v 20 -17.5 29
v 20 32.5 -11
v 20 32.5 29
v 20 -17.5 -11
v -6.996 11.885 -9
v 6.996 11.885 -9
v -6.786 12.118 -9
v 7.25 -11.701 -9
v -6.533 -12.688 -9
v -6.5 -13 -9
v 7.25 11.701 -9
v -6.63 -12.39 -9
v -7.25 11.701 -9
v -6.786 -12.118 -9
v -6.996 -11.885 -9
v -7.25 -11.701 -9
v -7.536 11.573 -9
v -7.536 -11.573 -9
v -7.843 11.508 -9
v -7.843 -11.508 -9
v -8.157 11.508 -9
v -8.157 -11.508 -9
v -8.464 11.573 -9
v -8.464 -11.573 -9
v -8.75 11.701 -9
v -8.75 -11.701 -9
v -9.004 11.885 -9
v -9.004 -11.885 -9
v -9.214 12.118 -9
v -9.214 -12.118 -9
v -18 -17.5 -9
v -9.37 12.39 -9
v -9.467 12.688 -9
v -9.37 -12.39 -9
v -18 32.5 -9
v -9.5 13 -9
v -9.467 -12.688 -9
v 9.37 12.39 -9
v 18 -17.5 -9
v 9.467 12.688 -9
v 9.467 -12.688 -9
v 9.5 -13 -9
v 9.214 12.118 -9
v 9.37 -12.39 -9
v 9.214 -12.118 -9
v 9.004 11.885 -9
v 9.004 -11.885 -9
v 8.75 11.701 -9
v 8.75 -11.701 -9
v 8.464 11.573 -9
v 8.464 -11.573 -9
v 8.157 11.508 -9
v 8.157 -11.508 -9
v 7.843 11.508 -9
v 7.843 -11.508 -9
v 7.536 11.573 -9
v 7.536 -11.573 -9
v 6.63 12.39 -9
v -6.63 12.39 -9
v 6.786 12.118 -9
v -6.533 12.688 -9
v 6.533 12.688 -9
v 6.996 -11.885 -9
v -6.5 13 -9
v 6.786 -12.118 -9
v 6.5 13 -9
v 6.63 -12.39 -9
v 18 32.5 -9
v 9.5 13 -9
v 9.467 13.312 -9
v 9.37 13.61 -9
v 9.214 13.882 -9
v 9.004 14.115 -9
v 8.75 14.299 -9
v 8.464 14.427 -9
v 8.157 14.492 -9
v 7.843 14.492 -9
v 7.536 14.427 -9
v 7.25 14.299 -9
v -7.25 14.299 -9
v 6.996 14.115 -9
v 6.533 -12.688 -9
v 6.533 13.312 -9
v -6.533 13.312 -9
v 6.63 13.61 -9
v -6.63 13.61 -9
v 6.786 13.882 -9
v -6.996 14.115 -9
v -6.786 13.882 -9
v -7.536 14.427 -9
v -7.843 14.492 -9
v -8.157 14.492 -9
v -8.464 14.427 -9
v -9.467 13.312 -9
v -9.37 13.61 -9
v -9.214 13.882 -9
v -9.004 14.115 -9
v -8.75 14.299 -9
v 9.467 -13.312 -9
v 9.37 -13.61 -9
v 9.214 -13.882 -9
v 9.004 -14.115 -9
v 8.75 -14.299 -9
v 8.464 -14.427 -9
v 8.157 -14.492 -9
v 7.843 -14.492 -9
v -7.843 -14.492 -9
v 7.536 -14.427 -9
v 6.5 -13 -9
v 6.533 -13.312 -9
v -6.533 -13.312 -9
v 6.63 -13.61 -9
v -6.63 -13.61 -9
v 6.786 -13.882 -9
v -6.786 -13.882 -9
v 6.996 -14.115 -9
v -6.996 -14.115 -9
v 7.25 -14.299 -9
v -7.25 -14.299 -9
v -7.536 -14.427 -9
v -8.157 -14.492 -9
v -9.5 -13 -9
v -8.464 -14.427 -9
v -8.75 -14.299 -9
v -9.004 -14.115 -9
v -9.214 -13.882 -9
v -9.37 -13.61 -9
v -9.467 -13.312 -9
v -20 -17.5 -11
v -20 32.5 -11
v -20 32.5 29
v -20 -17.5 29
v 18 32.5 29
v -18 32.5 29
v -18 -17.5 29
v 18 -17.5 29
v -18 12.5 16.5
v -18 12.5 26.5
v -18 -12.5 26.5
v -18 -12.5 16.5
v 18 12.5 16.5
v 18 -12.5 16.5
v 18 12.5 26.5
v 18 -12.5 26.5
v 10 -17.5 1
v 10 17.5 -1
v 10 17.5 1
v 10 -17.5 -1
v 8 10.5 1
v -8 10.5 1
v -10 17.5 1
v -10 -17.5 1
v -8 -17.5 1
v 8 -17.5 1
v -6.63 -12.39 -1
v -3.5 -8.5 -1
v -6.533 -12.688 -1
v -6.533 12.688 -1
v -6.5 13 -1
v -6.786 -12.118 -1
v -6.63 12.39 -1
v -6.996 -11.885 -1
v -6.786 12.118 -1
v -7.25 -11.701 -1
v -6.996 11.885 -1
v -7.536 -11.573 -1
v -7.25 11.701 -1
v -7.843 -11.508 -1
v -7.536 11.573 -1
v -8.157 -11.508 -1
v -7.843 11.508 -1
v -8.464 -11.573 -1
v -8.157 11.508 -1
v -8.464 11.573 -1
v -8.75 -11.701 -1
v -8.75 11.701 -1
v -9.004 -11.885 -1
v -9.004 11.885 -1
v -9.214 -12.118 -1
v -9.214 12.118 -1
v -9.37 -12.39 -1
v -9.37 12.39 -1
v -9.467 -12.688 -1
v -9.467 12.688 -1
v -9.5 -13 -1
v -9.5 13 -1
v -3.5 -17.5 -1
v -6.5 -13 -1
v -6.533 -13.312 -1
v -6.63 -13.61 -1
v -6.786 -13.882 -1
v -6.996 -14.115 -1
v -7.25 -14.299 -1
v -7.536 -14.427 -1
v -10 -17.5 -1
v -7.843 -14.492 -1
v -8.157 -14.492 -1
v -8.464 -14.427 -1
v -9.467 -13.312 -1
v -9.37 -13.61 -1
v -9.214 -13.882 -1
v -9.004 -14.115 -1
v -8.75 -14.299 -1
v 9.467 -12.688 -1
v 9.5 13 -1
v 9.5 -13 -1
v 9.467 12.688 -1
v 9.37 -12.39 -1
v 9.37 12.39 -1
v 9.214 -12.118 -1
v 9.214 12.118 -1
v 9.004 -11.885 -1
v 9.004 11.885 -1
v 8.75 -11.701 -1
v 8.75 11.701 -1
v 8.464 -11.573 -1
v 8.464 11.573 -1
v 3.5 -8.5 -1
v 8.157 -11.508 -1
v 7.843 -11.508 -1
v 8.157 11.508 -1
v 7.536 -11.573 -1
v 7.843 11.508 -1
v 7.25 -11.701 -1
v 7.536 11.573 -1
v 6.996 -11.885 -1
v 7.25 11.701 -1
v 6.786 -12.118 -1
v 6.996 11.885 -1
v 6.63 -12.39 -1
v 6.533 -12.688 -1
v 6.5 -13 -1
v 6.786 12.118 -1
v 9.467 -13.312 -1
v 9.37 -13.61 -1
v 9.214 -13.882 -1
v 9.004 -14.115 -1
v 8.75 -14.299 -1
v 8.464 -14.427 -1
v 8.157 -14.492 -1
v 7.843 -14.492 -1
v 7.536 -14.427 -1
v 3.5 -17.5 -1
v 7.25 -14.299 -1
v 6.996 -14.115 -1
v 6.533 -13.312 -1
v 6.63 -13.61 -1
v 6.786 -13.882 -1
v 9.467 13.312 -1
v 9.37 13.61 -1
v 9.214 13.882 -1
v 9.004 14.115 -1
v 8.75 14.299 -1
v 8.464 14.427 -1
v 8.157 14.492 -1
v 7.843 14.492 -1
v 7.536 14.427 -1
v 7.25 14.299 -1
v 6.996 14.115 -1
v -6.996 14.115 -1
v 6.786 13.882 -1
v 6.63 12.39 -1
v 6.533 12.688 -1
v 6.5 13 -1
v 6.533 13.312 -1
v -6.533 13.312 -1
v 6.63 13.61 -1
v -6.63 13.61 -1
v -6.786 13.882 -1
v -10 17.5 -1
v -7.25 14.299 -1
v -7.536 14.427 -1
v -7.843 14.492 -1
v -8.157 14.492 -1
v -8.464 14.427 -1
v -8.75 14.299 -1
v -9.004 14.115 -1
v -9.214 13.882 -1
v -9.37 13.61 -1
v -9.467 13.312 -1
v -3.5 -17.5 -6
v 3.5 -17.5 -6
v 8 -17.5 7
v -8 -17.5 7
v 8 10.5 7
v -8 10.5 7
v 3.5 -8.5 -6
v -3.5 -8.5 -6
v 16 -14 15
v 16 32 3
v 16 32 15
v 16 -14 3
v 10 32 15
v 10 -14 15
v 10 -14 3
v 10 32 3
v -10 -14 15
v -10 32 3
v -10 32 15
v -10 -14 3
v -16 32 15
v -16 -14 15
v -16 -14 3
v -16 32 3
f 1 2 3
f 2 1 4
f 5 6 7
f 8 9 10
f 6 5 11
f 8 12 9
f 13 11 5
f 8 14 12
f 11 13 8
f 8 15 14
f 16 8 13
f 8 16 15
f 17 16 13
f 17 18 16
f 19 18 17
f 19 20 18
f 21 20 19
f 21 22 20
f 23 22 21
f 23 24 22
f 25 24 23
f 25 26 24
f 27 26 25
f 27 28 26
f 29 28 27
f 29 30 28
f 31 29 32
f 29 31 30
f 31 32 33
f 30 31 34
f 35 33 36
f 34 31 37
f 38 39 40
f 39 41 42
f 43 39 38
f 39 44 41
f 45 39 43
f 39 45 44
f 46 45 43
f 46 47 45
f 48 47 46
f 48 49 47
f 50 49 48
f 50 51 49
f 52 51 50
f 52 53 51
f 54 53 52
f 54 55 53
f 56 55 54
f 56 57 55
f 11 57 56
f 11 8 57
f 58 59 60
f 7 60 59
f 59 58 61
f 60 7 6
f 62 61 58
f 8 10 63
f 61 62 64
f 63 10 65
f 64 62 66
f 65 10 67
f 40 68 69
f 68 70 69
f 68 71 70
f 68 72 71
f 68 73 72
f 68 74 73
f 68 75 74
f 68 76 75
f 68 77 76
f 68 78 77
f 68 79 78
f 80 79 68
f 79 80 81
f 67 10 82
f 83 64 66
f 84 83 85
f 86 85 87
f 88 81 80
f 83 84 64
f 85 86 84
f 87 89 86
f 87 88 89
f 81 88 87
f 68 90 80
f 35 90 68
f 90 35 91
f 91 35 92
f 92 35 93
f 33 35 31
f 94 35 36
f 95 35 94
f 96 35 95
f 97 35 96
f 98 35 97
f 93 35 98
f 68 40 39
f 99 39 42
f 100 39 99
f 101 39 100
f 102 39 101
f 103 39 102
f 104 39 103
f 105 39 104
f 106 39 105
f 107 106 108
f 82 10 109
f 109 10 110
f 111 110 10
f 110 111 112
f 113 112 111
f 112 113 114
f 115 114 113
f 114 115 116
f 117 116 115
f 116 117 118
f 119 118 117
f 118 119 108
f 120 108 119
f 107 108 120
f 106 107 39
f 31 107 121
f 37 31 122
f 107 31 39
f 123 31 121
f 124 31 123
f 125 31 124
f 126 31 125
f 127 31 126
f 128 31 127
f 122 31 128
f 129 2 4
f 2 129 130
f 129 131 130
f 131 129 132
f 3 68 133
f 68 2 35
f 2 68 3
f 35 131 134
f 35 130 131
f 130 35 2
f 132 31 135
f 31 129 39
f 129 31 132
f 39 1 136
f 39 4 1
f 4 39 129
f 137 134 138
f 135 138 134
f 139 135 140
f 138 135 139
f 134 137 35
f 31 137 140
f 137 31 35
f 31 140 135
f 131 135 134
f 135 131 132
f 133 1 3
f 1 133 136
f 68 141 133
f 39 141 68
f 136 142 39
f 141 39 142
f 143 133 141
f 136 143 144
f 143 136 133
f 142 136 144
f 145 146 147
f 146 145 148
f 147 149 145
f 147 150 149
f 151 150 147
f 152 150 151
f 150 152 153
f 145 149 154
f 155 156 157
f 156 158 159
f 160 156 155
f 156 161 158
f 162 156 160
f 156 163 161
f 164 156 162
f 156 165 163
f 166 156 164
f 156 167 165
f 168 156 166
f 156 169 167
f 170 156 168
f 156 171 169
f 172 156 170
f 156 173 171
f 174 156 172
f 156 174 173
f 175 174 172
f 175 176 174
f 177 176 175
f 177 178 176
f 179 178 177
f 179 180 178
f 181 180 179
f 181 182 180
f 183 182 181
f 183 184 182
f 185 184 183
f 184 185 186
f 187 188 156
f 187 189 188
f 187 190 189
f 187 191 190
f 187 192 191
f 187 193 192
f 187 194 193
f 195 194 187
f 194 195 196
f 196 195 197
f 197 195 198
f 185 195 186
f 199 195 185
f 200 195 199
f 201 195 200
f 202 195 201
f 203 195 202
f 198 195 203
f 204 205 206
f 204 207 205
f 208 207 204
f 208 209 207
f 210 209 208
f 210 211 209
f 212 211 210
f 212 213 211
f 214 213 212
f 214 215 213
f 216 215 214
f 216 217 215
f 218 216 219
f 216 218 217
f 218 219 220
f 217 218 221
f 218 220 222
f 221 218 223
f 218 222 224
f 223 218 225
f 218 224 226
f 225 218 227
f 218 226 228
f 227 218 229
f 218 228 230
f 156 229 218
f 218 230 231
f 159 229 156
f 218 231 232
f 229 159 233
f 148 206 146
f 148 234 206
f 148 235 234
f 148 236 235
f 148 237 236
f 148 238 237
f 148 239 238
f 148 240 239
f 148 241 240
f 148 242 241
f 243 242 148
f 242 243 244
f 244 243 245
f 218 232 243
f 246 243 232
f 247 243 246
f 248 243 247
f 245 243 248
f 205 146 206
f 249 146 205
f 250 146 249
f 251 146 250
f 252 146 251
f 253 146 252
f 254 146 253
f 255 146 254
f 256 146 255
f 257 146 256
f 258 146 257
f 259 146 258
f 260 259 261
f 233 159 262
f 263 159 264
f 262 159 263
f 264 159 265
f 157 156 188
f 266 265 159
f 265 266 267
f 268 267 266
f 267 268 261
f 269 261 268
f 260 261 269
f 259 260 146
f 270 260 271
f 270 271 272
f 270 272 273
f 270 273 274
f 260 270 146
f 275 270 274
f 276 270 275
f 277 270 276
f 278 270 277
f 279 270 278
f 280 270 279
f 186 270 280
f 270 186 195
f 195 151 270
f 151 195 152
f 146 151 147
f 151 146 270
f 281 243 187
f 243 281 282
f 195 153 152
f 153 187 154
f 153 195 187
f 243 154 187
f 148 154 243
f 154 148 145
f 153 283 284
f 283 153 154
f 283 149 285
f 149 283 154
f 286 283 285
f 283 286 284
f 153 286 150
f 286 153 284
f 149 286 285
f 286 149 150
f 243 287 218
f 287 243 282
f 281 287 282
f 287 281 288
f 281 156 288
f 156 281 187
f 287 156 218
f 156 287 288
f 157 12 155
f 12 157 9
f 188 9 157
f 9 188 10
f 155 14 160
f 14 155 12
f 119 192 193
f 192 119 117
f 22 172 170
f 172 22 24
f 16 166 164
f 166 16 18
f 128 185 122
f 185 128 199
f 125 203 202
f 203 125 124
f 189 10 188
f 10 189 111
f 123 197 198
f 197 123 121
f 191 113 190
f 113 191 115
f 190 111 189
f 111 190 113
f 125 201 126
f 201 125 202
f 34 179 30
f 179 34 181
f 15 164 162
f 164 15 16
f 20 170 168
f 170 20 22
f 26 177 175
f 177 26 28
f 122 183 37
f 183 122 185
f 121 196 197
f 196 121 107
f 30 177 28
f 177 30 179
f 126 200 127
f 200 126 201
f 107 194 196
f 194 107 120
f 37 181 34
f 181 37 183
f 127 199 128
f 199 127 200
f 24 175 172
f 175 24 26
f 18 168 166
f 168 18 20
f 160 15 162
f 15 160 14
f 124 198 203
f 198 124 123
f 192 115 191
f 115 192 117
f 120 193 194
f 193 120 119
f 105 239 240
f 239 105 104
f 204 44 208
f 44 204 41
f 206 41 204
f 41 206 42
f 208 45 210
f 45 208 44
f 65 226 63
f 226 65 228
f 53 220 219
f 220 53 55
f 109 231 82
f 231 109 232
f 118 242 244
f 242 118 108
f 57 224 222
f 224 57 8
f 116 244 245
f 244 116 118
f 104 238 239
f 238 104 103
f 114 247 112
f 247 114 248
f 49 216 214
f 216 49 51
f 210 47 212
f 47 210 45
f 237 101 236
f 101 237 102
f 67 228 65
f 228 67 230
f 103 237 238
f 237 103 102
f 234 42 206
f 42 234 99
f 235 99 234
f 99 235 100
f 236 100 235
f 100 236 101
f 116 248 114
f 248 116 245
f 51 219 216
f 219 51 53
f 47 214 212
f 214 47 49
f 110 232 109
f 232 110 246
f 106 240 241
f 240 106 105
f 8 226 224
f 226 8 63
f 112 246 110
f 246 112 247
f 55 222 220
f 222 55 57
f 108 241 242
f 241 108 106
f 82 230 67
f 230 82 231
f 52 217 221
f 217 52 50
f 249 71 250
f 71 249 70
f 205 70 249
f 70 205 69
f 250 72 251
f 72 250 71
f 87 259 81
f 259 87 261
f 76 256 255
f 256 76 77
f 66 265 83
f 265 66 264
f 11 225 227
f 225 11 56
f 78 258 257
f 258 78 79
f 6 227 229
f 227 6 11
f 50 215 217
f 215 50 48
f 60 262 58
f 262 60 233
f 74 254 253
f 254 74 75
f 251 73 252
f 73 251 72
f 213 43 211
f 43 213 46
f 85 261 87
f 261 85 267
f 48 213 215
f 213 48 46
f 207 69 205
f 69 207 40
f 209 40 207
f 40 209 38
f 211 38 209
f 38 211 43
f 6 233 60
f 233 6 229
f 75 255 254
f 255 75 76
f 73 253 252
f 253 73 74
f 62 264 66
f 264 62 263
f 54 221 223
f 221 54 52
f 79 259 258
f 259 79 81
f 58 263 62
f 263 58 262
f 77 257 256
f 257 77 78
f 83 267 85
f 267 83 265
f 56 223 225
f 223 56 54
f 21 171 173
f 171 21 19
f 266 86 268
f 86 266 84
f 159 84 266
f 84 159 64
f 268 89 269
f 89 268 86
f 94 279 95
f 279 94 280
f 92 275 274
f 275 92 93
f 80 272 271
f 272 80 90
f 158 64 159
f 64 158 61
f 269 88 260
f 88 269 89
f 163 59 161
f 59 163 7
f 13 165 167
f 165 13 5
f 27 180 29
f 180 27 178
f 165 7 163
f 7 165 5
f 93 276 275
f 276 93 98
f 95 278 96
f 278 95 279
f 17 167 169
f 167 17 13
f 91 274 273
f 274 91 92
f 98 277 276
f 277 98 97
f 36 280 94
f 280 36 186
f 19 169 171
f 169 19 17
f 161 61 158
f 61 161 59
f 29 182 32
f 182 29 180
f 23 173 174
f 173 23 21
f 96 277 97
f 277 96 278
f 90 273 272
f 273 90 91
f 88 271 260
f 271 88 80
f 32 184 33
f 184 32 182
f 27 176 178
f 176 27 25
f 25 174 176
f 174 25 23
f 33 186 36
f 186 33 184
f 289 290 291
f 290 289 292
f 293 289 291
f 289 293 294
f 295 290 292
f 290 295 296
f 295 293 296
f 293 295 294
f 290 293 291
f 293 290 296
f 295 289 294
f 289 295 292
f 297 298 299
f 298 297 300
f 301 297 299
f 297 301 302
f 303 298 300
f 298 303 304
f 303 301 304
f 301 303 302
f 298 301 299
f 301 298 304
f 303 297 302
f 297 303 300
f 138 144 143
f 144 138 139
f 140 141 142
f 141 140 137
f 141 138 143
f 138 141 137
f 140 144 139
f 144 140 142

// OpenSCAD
//obudowa
translate([0,7.5,-10]){
color("grey")cube([40,50,2],true);
}
/*
translate([0,7.5,28]){
color("grey")cube([40,50,2],true);
}
*/
translate([-19,7.5,9]){
color("grey")cube([2,50,40],true);
}
translate([19,7.5,9]){
color("grey")cube([2,50,40],true);
}

//elektronika
translate([0,0,0]){
color("green")cube([20,35,2],true);
}
//trinket
translate([0,-3.5,4]){    
color("red")cube([16,28,6],true);
}
//gniazdo
translate([0,-13,-3.5]){    
color("yellow")cube([7,9,5],true);
}

//dystanse
translate([-8,-13,-9]){    
color("black")cylinder(8,1.5,1.5,$fn=30);
}
translate([8,-13,-9]){    
color("black")cylinder(8,1.5,1.5,$fn=30);
}
translate([8,13,-9]){    
color("black")cylinder(8,1.5,1.5,$fn=30);
}
translate([-8,13,-9]){    
color("black")cylinder(8,1.5,1.5,$fn=30);
}

//tensometry
translate([13,9,9]){
color("blue")cube([6,46,12],true);
}
translate([-13,9,9]){
color("blue")cube([6,46,12],true);
}
//aku
translate([0,0,21.5]){
color("pink")cube([36,25,10],true);
}
